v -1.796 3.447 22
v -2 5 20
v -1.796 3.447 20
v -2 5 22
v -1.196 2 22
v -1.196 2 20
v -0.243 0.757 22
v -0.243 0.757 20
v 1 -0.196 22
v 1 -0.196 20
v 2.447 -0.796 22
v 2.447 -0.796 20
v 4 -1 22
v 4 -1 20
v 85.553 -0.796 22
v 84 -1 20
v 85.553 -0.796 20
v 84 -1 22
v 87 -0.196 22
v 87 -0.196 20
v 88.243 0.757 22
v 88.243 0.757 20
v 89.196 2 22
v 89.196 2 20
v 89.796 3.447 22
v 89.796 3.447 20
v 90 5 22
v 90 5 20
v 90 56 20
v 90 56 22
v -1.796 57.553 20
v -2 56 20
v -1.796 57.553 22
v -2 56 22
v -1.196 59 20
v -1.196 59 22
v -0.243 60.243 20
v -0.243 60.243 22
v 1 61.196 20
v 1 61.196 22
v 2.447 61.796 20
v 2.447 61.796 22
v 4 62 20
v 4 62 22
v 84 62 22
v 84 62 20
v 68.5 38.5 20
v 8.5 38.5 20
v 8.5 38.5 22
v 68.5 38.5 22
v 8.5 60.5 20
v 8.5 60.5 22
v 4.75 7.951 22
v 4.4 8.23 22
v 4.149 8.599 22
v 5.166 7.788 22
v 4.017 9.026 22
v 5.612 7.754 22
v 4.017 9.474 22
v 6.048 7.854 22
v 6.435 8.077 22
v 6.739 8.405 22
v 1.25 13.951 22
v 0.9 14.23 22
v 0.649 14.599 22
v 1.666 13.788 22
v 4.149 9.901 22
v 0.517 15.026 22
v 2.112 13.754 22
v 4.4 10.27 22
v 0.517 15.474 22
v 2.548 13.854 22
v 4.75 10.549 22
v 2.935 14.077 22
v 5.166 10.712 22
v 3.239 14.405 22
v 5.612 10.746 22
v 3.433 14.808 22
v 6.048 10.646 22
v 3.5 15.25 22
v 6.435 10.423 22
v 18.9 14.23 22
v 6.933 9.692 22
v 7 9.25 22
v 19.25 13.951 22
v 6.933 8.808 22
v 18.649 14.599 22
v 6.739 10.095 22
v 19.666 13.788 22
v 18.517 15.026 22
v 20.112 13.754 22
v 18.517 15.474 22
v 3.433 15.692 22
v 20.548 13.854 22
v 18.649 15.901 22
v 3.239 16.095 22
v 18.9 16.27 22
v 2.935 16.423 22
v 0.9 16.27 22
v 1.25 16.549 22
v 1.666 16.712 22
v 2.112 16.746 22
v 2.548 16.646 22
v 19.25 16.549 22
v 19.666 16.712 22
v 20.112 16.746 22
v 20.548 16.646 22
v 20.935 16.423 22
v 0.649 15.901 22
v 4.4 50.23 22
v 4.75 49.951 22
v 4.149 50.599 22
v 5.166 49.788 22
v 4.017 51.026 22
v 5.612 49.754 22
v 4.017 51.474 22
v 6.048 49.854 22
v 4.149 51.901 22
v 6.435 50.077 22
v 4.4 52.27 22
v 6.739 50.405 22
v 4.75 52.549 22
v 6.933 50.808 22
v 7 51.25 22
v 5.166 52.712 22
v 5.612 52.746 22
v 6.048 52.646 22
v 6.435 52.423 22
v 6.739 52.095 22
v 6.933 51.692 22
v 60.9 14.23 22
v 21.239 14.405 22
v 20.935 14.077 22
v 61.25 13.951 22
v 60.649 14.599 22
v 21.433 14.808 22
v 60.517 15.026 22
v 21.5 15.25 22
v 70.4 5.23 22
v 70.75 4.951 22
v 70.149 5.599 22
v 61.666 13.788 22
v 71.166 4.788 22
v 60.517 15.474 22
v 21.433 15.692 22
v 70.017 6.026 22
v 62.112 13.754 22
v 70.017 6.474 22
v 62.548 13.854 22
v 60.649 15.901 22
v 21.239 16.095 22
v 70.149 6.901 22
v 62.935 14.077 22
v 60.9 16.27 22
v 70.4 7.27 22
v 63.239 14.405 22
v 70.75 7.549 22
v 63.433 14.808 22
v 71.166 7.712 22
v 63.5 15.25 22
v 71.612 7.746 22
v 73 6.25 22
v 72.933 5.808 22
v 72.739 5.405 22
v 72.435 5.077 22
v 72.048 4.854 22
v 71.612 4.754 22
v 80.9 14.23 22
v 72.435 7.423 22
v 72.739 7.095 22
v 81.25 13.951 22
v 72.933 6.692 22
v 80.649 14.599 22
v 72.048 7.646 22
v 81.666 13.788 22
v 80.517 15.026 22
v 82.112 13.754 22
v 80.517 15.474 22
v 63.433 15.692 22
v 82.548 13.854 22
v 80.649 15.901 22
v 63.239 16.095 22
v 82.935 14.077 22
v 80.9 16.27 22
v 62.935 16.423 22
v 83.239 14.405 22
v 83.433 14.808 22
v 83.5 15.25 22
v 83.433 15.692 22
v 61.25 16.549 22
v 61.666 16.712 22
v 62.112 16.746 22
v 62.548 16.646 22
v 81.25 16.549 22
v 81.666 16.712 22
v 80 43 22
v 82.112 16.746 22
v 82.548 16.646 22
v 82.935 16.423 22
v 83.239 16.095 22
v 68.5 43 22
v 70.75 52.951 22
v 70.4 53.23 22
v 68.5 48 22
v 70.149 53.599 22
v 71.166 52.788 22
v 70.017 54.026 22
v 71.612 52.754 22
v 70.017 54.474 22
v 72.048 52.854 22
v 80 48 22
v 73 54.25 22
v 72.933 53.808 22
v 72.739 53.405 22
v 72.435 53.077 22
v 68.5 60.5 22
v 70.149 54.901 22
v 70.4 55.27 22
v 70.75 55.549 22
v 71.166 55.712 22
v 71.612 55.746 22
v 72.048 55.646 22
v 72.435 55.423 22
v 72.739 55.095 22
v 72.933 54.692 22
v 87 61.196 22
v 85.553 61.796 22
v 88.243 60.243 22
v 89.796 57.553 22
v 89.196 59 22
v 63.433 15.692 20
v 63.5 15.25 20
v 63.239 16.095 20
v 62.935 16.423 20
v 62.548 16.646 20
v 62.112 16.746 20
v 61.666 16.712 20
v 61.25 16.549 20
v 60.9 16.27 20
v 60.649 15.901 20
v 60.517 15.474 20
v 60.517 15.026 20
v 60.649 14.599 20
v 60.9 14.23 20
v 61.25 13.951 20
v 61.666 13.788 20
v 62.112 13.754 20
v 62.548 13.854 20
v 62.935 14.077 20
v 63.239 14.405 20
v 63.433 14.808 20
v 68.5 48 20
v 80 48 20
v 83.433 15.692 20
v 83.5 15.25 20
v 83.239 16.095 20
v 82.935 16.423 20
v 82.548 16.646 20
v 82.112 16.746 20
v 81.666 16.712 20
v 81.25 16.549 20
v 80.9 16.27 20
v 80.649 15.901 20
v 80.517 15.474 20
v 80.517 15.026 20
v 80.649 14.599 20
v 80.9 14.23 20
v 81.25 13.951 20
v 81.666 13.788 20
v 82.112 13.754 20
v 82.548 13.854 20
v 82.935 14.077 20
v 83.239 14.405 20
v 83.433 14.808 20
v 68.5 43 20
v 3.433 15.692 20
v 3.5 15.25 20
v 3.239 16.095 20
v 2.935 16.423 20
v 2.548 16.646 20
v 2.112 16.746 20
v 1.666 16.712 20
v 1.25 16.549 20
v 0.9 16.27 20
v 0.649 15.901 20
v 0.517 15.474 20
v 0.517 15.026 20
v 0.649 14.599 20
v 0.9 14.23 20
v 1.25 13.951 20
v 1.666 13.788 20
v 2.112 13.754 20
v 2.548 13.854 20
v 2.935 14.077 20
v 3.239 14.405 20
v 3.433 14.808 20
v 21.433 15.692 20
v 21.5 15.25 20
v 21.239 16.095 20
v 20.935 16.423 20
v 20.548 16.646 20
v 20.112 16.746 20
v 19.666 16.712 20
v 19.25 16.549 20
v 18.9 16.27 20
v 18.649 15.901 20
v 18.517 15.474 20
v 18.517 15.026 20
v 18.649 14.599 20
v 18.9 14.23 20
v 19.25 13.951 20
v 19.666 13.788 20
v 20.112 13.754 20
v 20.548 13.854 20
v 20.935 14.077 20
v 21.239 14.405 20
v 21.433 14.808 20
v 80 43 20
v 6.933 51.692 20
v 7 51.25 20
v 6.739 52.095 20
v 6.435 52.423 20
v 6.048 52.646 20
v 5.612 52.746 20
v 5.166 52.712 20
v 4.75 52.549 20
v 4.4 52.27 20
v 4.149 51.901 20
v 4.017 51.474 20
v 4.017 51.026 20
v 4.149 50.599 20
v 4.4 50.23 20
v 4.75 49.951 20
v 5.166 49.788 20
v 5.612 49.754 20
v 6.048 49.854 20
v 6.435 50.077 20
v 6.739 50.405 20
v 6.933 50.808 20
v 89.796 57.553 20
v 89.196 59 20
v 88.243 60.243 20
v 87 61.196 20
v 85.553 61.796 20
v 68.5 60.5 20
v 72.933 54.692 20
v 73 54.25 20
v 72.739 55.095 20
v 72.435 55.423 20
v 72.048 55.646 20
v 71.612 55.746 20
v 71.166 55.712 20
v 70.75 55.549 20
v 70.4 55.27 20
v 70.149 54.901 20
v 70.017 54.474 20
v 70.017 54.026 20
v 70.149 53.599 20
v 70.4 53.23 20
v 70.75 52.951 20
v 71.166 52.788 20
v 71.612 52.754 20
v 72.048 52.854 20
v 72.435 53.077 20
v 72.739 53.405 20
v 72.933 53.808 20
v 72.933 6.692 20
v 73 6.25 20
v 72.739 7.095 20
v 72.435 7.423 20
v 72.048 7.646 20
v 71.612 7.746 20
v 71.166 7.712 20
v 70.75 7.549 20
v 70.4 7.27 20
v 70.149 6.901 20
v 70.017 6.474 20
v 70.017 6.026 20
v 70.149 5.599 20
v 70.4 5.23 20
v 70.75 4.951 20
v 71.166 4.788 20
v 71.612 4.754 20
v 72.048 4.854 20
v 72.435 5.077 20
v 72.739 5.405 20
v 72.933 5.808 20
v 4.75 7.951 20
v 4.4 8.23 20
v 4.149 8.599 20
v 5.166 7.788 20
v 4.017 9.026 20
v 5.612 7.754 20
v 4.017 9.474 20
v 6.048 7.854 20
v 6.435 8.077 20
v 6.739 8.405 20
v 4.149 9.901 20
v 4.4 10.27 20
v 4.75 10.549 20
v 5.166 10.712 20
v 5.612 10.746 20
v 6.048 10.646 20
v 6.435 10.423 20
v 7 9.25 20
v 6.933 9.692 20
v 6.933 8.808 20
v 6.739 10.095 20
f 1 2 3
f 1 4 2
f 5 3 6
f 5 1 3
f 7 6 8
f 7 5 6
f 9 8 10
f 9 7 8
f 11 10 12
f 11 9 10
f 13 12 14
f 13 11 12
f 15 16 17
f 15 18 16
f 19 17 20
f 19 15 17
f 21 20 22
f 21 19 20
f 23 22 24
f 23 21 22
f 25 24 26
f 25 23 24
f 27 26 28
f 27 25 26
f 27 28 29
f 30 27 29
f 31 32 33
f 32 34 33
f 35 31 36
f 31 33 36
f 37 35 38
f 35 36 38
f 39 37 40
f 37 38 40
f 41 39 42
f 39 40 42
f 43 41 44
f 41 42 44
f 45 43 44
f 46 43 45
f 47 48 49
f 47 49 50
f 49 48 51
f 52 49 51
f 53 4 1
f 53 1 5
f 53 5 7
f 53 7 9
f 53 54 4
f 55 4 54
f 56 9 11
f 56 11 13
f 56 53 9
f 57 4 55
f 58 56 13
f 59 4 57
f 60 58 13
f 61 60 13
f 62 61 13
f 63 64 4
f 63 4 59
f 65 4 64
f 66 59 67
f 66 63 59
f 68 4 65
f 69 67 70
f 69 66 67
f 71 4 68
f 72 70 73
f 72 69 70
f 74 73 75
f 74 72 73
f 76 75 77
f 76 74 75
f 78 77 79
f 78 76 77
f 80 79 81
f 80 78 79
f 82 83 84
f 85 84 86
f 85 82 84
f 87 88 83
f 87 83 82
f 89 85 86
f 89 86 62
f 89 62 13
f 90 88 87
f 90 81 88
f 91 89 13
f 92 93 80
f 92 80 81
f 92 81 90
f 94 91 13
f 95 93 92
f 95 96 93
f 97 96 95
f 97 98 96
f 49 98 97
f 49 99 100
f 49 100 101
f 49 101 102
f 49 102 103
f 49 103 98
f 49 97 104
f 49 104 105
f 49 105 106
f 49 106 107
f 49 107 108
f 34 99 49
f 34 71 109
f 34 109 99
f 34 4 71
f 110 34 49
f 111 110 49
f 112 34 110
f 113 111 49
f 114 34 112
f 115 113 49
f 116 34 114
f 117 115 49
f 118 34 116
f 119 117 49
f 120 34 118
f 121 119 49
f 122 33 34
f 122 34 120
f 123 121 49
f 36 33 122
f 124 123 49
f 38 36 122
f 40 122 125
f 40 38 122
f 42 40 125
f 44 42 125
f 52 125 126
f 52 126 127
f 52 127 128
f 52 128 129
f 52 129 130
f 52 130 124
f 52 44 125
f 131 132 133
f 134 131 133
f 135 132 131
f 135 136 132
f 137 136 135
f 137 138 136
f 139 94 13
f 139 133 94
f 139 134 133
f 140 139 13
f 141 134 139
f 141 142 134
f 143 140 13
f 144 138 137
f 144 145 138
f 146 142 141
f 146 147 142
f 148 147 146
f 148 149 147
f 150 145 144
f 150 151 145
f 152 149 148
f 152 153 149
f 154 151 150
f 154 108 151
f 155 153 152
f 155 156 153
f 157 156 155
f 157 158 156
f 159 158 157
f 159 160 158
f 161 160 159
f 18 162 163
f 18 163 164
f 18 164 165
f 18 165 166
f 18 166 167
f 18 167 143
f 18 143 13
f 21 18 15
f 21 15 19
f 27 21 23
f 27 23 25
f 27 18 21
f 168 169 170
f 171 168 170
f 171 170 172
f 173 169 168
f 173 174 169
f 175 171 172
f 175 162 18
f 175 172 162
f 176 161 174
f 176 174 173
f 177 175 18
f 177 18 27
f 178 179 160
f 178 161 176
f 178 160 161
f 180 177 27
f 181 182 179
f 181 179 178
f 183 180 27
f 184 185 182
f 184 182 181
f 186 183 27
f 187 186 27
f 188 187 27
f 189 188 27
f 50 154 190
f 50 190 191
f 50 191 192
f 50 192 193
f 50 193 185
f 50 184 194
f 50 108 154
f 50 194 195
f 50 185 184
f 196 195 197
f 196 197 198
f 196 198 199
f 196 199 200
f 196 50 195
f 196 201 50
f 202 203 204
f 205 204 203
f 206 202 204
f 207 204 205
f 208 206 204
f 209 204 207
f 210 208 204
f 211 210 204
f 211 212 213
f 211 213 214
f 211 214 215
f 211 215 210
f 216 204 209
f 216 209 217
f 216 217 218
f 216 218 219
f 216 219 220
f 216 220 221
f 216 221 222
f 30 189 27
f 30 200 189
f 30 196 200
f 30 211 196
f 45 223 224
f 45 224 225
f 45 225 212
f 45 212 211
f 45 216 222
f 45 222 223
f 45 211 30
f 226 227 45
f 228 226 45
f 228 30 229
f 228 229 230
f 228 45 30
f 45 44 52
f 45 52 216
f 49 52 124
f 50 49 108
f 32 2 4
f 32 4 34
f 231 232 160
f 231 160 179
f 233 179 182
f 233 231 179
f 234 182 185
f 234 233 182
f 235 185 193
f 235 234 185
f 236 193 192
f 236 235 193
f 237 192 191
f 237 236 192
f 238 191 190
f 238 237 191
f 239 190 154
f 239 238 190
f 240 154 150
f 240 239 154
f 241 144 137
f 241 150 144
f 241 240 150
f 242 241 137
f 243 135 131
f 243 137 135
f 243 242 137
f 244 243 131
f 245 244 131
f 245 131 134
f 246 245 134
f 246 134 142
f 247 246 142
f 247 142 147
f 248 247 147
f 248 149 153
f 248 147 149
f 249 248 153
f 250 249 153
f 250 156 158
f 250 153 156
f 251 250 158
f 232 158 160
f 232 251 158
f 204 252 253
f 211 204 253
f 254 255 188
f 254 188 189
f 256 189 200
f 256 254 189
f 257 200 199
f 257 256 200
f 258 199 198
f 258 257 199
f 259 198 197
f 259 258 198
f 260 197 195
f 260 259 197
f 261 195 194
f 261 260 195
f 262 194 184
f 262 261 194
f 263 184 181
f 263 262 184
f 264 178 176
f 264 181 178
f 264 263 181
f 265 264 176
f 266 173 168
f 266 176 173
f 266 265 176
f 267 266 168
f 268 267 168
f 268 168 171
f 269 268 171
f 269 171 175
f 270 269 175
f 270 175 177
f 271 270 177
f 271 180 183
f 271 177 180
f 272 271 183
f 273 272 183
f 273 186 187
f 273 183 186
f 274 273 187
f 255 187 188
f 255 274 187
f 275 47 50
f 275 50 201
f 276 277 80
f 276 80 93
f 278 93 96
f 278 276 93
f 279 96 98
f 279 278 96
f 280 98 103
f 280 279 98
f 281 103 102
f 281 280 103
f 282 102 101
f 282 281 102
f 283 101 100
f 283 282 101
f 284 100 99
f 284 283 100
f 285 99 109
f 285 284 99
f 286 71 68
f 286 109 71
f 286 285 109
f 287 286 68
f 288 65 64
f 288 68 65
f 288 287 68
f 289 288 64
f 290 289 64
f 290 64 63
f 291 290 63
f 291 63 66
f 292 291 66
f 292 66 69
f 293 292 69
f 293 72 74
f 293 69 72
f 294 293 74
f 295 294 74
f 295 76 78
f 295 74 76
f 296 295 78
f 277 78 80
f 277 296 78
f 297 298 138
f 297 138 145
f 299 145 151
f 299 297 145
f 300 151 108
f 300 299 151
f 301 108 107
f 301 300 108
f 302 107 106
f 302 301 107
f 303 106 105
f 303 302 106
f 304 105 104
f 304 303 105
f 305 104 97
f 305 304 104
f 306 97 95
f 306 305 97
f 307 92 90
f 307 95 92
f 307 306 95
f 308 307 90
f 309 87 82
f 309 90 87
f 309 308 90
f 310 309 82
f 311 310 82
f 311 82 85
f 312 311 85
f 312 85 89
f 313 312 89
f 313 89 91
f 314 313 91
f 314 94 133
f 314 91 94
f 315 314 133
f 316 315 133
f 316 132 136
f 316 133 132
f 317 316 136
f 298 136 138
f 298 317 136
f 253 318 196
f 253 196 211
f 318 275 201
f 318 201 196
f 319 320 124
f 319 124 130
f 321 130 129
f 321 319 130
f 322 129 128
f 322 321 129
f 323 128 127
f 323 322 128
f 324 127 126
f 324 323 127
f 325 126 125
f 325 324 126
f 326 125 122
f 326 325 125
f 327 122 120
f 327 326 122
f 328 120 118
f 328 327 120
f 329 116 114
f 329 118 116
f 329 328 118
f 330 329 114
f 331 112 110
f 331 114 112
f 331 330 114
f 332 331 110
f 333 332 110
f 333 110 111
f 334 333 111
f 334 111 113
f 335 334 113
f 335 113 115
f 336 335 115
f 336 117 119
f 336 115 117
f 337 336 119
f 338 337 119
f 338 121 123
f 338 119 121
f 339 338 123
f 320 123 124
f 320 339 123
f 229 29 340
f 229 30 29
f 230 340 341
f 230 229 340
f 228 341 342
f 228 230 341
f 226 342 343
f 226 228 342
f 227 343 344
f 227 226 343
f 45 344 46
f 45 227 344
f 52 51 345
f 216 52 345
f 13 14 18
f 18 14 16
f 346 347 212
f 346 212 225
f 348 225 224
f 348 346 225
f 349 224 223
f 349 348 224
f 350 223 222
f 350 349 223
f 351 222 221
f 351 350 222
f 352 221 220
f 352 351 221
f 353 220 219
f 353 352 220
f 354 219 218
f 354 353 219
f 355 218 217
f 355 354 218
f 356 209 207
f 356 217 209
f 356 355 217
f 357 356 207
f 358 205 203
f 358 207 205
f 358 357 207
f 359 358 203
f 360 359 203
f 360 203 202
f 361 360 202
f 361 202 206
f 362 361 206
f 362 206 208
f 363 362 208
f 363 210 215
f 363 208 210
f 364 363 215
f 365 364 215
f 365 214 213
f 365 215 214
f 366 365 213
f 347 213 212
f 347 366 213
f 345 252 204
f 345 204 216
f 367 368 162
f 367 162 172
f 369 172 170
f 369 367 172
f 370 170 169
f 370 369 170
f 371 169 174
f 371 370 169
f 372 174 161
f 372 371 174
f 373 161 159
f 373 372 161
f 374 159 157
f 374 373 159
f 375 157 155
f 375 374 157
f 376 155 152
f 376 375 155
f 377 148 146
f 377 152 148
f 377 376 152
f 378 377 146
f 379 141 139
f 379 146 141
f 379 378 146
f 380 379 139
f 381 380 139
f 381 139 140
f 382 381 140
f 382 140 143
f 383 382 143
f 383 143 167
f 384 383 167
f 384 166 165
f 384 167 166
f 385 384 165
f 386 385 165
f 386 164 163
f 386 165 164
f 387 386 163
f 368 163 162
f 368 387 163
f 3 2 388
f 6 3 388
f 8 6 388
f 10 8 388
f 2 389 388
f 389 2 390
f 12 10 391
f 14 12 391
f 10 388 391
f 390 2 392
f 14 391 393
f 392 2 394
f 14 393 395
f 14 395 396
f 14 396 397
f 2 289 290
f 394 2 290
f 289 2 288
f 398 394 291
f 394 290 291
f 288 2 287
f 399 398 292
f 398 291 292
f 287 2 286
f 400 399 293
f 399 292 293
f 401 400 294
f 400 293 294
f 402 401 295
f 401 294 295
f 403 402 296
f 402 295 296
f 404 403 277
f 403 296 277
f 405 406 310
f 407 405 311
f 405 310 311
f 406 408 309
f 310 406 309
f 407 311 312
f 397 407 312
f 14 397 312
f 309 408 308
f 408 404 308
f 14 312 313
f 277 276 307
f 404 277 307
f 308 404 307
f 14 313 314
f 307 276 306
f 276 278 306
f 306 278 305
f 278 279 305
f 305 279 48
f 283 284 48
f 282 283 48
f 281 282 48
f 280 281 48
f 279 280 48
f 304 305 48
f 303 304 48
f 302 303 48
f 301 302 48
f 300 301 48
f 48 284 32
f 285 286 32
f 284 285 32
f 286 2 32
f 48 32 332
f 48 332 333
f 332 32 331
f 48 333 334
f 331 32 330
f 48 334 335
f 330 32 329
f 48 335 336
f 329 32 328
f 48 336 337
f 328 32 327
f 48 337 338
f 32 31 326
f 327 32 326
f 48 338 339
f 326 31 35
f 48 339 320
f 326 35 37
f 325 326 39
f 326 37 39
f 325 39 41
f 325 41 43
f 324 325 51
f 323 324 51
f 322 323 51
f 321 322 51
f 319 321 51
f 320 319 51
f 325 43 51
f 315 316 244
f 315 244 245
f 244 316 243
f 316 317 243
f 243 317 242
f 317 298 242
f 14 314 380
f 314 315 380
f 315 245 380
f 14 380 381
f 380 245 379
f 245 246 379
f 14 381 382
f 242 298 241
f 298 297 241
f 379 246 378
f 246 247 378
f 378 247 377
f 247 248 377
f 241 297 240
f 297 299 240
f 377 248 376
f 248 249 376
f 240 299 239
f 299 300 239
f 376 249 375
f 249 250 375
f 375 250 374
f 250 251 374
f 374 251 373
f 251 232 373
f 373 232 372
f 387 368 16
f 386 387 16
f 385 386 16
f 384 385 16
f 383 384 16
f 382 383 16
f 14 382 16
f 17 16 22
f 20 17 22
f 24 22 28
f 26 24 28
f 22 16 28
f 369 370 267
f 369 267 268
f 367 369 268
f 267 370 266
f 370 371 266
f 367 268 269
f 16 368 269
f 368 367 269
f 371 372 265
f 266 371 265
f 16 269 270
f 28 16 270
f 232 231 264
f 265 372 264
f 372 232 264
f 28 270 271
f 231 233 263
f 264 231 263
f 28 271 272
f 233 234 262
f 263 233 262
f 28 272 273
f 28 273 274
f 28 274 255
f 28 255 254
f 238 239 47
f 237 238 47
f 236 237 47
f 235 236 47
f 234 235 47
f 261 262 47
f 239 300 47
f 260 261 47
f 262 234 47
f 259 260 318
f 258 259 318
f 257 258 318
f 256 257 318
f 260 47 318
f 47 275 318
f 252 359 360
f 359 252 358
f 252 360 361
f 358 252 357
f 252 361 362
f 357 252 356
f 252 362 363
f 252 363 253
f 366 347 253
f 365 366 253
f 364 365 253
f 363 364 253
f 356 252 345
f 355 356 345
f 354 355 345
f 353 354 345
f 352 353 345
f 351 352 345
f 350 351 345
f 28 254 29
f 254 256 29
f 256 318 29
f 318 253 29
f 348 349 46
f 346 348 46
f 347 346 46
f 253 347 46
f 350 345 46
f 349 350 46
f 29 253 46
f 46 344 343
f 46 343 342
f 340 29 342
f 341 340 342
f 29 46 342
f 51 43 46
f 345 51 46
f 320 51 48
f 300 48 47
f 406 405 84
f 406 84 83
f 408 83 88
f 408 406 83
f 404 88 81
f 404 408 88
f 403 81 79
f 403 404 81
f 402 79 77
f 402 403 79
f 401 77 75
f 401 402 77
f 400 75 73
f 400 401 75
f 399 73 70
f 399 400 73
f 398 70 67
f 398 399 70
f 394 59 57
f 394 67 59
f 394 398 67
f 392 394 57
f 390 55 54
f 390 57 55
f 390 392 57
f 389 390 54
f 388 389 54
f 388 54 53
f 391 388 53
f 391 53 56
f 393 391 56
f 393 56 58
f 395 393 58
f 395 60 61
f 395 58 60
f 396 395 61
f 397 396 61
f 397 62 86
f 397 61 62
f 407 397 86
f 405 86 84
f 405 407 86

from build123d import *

# Parameters (mm, degrees)
BOX009_W          = 12
BOX009_H          = 5
BOX009_DEPTH      = 10
BOX008_W          = 60
BOX008_H          = 22
BOX008_DEPTH      = 10
CYLINDER014_R     = 1.5
CYLINDER014_DEPTH = 20
CYLINDER013_R     = 1.5
CYLINDER013_DEPTH = 20
CYLINDER012_R     = 1.5
CYLINDER012_DEPTH = 20
CYLINDER015_R     = 1.5
CYLINDER015_DEPTH = 20
CYLINDER009_R     = 1.5
CYLINDER009_DEPTH = 20
CYLINDER010_R     = 1.5
CYLINDER010_DEPTH = 20
CYLINDER011_R     = 1.5
CYLINDER011_DEPTH = 20
CYLINDER008_R     = 1.5
CYLINDER008_DEPTH = 20
BOX003_W          = 92
BOX003_H          = 63
BOX003_DEPTH      = 2
FILLET001_R       = 6


with BuildPart() as cube006:
    # Box009 → Box009 (new body)
    with BuildSketch(Plane(origin=(68, 43, 20), x_dir=(1, 0, 0), z_dir=(0, 0, 1))):
        with Locations((6, 2.5)):
            Rectangle(BOX009_W, BOX009_H)
    extrude(amount=BOX009_DEPTH)


with BuildPart() as cube005:
    # Box008 → Box008 (new body)
    with BuildSketch(Plane(origin=(8.5, 38.5, 20), x_dir=(1, 0, 0), z_dir=(0, 0, 1))):
        with Locations((30, 11)):
            Rectangle(BOX008_W, BOX008_H)
    extrude(amount=BOX008_DEPTH)


with BuildPart() as cylinder014:
    # Cylinder014 → Cylinder014 (new body)
    with BuildSketch(Plane(origin=(82, 15.25, 20), x_dir=(1, 0, 0), z_dir=(0, 0, 1))):
        Circle(CYLINDER014_R)
    extrude(amount=CYLINDER014_DEPTH)


with BuildPart() as cylinder013:
    # Cylinder013 → Cylinder013 (new body)
    with BuildSketch(Plane(origin=(20, 15.25, 20), x_dir=(1, 0, 0), z_dir=(0, 0, 1))):
        Circle(CYLINDER013_R)
    extrude(amount=CYLINDER013_DEPTH)


with BuildPart() as cylinder012:
    # Cylinder012 → Cylinder012 (new body)
    with BuildSketch(Plane(origin=(2, 15.25, 20), x_dir=(1, 0, 0), z_dir=(0, 0, 1))):
        Circle(CYLINDER012_R)
    extrude(amount=CYLINDER012_DEPTH)


with BuildPart() as fusion003:
    # Cylinder015 → Cylinder015 (new body)
    with BuildSketch(Plane(origin=(62, 15.25, 20), x_dir=(1, 0, 0), z_dir=(0, 0, 1))):
        Circle(CYLINDER015_R)
    extrude(amount=CYLINDER015_DEPTH)

    # Fusion003: union Cylinder014, Cylinder013, Cylinder012
    add(cylinder014.part)
    add(cylinder013.part)
    add(cylinder012.part)


with BuildPart() as cylinder009:
    # Cylinder009 → Cylinder009 (new body)
    with BuildSketch(Plane(origin=(5.5, 9.25, 20), x_dir=(1, 0, 0), z_dir=(0, 0, 1))):
        Circle(CYLINDER009_R)
    extrude(amount=CYLINDER009_DEPTH)


with BuildPart() as cylinder010:
    # Cylinder010 → Cylinder010 (new body)
    with BuildSketch(Plane(origin=(5.5, 51.25, 20), x_dir=(1, 0, 0), z_dir=(0, 0, 1))):
        Circle(CYLINDER010_R)
    extrude(amount=CYLINDER010_DEPTH)


with BuildPart() as cylinder011:
    # Cylinder011 → Cylinder011 (new body)
    with BuildSketch(Plane(origin=(71.5, 54.25, 20), x_dir=(1, 0, 0), z_dir=(0, 0, 1))):
        Circle(CYLINDER011_R)
    extrude(amount=CYLINDER011_DEPTH)


with BuildPart() as fusion002:
    # Cylinder008 → Cylinder008 (new body)
    with BuildSketch(Plane(origin=(71.5, 6.25, 20), x_dir=(1, 0, 0), z_dir=(0, 0, 1))):
        Circle(CYLINDER008_R)
    extrude(amount=CYLINDER008_DEPTH)

    # Fusion002: union Cylinder009, Cylinder010, Cylinder011
    add(cylinder009.part)
    add(cylinder010.part)
    add(cylinder011.part)


with BuildPart() as middle_base:
    # Box003 → Box003 (new body)
    with BuildSketch(Plane(origin=(-2, -1, 0), x_dir=(1, 0, 0), z_dir=(0, 0, 1))):
        with Locations((46, 31.5)):
            Rectangle(BOX003_W, BOX003_H)
    extrude(amount=BOX003_DEPTH)

    # Fillet001
    fillet001_edges = [middle_base.edges().sort_by_distance(p)[0] for p in [
        (-2, -1, 1),
        (-2, 62, 1),
        (90, -1, 1),
        (90, 62, 1),
    ]]
    fillet(fillet001_edges, radius=FILLET001_R)


with BuildPart() as middle_base_1:
    # Fillet001 placement: moved
    add(middle_base.part.moved(Location((0, 0, 26))))

    # Cut002: cut Fusion002
    add(fusion002.part, mode=Mode.SUBTRACT)

    # Cut003: cut Fusion003
    add(fusion003.part, mode=Mode.SUBTRACT)

    # Cut007: cut Cube005
    add(cube005.part, mode=Mode.SUBTRACT)

    # Cut008: cut Cube006
    add(cube006.part, mode=Mode.SUBTRACT)


with BuildPart() as middle_base_2:
    # Cut008 placement: moved
    add(middle_base_1.part.moved(Location((0, 0, -6))))


solid = middle_base_2.part
